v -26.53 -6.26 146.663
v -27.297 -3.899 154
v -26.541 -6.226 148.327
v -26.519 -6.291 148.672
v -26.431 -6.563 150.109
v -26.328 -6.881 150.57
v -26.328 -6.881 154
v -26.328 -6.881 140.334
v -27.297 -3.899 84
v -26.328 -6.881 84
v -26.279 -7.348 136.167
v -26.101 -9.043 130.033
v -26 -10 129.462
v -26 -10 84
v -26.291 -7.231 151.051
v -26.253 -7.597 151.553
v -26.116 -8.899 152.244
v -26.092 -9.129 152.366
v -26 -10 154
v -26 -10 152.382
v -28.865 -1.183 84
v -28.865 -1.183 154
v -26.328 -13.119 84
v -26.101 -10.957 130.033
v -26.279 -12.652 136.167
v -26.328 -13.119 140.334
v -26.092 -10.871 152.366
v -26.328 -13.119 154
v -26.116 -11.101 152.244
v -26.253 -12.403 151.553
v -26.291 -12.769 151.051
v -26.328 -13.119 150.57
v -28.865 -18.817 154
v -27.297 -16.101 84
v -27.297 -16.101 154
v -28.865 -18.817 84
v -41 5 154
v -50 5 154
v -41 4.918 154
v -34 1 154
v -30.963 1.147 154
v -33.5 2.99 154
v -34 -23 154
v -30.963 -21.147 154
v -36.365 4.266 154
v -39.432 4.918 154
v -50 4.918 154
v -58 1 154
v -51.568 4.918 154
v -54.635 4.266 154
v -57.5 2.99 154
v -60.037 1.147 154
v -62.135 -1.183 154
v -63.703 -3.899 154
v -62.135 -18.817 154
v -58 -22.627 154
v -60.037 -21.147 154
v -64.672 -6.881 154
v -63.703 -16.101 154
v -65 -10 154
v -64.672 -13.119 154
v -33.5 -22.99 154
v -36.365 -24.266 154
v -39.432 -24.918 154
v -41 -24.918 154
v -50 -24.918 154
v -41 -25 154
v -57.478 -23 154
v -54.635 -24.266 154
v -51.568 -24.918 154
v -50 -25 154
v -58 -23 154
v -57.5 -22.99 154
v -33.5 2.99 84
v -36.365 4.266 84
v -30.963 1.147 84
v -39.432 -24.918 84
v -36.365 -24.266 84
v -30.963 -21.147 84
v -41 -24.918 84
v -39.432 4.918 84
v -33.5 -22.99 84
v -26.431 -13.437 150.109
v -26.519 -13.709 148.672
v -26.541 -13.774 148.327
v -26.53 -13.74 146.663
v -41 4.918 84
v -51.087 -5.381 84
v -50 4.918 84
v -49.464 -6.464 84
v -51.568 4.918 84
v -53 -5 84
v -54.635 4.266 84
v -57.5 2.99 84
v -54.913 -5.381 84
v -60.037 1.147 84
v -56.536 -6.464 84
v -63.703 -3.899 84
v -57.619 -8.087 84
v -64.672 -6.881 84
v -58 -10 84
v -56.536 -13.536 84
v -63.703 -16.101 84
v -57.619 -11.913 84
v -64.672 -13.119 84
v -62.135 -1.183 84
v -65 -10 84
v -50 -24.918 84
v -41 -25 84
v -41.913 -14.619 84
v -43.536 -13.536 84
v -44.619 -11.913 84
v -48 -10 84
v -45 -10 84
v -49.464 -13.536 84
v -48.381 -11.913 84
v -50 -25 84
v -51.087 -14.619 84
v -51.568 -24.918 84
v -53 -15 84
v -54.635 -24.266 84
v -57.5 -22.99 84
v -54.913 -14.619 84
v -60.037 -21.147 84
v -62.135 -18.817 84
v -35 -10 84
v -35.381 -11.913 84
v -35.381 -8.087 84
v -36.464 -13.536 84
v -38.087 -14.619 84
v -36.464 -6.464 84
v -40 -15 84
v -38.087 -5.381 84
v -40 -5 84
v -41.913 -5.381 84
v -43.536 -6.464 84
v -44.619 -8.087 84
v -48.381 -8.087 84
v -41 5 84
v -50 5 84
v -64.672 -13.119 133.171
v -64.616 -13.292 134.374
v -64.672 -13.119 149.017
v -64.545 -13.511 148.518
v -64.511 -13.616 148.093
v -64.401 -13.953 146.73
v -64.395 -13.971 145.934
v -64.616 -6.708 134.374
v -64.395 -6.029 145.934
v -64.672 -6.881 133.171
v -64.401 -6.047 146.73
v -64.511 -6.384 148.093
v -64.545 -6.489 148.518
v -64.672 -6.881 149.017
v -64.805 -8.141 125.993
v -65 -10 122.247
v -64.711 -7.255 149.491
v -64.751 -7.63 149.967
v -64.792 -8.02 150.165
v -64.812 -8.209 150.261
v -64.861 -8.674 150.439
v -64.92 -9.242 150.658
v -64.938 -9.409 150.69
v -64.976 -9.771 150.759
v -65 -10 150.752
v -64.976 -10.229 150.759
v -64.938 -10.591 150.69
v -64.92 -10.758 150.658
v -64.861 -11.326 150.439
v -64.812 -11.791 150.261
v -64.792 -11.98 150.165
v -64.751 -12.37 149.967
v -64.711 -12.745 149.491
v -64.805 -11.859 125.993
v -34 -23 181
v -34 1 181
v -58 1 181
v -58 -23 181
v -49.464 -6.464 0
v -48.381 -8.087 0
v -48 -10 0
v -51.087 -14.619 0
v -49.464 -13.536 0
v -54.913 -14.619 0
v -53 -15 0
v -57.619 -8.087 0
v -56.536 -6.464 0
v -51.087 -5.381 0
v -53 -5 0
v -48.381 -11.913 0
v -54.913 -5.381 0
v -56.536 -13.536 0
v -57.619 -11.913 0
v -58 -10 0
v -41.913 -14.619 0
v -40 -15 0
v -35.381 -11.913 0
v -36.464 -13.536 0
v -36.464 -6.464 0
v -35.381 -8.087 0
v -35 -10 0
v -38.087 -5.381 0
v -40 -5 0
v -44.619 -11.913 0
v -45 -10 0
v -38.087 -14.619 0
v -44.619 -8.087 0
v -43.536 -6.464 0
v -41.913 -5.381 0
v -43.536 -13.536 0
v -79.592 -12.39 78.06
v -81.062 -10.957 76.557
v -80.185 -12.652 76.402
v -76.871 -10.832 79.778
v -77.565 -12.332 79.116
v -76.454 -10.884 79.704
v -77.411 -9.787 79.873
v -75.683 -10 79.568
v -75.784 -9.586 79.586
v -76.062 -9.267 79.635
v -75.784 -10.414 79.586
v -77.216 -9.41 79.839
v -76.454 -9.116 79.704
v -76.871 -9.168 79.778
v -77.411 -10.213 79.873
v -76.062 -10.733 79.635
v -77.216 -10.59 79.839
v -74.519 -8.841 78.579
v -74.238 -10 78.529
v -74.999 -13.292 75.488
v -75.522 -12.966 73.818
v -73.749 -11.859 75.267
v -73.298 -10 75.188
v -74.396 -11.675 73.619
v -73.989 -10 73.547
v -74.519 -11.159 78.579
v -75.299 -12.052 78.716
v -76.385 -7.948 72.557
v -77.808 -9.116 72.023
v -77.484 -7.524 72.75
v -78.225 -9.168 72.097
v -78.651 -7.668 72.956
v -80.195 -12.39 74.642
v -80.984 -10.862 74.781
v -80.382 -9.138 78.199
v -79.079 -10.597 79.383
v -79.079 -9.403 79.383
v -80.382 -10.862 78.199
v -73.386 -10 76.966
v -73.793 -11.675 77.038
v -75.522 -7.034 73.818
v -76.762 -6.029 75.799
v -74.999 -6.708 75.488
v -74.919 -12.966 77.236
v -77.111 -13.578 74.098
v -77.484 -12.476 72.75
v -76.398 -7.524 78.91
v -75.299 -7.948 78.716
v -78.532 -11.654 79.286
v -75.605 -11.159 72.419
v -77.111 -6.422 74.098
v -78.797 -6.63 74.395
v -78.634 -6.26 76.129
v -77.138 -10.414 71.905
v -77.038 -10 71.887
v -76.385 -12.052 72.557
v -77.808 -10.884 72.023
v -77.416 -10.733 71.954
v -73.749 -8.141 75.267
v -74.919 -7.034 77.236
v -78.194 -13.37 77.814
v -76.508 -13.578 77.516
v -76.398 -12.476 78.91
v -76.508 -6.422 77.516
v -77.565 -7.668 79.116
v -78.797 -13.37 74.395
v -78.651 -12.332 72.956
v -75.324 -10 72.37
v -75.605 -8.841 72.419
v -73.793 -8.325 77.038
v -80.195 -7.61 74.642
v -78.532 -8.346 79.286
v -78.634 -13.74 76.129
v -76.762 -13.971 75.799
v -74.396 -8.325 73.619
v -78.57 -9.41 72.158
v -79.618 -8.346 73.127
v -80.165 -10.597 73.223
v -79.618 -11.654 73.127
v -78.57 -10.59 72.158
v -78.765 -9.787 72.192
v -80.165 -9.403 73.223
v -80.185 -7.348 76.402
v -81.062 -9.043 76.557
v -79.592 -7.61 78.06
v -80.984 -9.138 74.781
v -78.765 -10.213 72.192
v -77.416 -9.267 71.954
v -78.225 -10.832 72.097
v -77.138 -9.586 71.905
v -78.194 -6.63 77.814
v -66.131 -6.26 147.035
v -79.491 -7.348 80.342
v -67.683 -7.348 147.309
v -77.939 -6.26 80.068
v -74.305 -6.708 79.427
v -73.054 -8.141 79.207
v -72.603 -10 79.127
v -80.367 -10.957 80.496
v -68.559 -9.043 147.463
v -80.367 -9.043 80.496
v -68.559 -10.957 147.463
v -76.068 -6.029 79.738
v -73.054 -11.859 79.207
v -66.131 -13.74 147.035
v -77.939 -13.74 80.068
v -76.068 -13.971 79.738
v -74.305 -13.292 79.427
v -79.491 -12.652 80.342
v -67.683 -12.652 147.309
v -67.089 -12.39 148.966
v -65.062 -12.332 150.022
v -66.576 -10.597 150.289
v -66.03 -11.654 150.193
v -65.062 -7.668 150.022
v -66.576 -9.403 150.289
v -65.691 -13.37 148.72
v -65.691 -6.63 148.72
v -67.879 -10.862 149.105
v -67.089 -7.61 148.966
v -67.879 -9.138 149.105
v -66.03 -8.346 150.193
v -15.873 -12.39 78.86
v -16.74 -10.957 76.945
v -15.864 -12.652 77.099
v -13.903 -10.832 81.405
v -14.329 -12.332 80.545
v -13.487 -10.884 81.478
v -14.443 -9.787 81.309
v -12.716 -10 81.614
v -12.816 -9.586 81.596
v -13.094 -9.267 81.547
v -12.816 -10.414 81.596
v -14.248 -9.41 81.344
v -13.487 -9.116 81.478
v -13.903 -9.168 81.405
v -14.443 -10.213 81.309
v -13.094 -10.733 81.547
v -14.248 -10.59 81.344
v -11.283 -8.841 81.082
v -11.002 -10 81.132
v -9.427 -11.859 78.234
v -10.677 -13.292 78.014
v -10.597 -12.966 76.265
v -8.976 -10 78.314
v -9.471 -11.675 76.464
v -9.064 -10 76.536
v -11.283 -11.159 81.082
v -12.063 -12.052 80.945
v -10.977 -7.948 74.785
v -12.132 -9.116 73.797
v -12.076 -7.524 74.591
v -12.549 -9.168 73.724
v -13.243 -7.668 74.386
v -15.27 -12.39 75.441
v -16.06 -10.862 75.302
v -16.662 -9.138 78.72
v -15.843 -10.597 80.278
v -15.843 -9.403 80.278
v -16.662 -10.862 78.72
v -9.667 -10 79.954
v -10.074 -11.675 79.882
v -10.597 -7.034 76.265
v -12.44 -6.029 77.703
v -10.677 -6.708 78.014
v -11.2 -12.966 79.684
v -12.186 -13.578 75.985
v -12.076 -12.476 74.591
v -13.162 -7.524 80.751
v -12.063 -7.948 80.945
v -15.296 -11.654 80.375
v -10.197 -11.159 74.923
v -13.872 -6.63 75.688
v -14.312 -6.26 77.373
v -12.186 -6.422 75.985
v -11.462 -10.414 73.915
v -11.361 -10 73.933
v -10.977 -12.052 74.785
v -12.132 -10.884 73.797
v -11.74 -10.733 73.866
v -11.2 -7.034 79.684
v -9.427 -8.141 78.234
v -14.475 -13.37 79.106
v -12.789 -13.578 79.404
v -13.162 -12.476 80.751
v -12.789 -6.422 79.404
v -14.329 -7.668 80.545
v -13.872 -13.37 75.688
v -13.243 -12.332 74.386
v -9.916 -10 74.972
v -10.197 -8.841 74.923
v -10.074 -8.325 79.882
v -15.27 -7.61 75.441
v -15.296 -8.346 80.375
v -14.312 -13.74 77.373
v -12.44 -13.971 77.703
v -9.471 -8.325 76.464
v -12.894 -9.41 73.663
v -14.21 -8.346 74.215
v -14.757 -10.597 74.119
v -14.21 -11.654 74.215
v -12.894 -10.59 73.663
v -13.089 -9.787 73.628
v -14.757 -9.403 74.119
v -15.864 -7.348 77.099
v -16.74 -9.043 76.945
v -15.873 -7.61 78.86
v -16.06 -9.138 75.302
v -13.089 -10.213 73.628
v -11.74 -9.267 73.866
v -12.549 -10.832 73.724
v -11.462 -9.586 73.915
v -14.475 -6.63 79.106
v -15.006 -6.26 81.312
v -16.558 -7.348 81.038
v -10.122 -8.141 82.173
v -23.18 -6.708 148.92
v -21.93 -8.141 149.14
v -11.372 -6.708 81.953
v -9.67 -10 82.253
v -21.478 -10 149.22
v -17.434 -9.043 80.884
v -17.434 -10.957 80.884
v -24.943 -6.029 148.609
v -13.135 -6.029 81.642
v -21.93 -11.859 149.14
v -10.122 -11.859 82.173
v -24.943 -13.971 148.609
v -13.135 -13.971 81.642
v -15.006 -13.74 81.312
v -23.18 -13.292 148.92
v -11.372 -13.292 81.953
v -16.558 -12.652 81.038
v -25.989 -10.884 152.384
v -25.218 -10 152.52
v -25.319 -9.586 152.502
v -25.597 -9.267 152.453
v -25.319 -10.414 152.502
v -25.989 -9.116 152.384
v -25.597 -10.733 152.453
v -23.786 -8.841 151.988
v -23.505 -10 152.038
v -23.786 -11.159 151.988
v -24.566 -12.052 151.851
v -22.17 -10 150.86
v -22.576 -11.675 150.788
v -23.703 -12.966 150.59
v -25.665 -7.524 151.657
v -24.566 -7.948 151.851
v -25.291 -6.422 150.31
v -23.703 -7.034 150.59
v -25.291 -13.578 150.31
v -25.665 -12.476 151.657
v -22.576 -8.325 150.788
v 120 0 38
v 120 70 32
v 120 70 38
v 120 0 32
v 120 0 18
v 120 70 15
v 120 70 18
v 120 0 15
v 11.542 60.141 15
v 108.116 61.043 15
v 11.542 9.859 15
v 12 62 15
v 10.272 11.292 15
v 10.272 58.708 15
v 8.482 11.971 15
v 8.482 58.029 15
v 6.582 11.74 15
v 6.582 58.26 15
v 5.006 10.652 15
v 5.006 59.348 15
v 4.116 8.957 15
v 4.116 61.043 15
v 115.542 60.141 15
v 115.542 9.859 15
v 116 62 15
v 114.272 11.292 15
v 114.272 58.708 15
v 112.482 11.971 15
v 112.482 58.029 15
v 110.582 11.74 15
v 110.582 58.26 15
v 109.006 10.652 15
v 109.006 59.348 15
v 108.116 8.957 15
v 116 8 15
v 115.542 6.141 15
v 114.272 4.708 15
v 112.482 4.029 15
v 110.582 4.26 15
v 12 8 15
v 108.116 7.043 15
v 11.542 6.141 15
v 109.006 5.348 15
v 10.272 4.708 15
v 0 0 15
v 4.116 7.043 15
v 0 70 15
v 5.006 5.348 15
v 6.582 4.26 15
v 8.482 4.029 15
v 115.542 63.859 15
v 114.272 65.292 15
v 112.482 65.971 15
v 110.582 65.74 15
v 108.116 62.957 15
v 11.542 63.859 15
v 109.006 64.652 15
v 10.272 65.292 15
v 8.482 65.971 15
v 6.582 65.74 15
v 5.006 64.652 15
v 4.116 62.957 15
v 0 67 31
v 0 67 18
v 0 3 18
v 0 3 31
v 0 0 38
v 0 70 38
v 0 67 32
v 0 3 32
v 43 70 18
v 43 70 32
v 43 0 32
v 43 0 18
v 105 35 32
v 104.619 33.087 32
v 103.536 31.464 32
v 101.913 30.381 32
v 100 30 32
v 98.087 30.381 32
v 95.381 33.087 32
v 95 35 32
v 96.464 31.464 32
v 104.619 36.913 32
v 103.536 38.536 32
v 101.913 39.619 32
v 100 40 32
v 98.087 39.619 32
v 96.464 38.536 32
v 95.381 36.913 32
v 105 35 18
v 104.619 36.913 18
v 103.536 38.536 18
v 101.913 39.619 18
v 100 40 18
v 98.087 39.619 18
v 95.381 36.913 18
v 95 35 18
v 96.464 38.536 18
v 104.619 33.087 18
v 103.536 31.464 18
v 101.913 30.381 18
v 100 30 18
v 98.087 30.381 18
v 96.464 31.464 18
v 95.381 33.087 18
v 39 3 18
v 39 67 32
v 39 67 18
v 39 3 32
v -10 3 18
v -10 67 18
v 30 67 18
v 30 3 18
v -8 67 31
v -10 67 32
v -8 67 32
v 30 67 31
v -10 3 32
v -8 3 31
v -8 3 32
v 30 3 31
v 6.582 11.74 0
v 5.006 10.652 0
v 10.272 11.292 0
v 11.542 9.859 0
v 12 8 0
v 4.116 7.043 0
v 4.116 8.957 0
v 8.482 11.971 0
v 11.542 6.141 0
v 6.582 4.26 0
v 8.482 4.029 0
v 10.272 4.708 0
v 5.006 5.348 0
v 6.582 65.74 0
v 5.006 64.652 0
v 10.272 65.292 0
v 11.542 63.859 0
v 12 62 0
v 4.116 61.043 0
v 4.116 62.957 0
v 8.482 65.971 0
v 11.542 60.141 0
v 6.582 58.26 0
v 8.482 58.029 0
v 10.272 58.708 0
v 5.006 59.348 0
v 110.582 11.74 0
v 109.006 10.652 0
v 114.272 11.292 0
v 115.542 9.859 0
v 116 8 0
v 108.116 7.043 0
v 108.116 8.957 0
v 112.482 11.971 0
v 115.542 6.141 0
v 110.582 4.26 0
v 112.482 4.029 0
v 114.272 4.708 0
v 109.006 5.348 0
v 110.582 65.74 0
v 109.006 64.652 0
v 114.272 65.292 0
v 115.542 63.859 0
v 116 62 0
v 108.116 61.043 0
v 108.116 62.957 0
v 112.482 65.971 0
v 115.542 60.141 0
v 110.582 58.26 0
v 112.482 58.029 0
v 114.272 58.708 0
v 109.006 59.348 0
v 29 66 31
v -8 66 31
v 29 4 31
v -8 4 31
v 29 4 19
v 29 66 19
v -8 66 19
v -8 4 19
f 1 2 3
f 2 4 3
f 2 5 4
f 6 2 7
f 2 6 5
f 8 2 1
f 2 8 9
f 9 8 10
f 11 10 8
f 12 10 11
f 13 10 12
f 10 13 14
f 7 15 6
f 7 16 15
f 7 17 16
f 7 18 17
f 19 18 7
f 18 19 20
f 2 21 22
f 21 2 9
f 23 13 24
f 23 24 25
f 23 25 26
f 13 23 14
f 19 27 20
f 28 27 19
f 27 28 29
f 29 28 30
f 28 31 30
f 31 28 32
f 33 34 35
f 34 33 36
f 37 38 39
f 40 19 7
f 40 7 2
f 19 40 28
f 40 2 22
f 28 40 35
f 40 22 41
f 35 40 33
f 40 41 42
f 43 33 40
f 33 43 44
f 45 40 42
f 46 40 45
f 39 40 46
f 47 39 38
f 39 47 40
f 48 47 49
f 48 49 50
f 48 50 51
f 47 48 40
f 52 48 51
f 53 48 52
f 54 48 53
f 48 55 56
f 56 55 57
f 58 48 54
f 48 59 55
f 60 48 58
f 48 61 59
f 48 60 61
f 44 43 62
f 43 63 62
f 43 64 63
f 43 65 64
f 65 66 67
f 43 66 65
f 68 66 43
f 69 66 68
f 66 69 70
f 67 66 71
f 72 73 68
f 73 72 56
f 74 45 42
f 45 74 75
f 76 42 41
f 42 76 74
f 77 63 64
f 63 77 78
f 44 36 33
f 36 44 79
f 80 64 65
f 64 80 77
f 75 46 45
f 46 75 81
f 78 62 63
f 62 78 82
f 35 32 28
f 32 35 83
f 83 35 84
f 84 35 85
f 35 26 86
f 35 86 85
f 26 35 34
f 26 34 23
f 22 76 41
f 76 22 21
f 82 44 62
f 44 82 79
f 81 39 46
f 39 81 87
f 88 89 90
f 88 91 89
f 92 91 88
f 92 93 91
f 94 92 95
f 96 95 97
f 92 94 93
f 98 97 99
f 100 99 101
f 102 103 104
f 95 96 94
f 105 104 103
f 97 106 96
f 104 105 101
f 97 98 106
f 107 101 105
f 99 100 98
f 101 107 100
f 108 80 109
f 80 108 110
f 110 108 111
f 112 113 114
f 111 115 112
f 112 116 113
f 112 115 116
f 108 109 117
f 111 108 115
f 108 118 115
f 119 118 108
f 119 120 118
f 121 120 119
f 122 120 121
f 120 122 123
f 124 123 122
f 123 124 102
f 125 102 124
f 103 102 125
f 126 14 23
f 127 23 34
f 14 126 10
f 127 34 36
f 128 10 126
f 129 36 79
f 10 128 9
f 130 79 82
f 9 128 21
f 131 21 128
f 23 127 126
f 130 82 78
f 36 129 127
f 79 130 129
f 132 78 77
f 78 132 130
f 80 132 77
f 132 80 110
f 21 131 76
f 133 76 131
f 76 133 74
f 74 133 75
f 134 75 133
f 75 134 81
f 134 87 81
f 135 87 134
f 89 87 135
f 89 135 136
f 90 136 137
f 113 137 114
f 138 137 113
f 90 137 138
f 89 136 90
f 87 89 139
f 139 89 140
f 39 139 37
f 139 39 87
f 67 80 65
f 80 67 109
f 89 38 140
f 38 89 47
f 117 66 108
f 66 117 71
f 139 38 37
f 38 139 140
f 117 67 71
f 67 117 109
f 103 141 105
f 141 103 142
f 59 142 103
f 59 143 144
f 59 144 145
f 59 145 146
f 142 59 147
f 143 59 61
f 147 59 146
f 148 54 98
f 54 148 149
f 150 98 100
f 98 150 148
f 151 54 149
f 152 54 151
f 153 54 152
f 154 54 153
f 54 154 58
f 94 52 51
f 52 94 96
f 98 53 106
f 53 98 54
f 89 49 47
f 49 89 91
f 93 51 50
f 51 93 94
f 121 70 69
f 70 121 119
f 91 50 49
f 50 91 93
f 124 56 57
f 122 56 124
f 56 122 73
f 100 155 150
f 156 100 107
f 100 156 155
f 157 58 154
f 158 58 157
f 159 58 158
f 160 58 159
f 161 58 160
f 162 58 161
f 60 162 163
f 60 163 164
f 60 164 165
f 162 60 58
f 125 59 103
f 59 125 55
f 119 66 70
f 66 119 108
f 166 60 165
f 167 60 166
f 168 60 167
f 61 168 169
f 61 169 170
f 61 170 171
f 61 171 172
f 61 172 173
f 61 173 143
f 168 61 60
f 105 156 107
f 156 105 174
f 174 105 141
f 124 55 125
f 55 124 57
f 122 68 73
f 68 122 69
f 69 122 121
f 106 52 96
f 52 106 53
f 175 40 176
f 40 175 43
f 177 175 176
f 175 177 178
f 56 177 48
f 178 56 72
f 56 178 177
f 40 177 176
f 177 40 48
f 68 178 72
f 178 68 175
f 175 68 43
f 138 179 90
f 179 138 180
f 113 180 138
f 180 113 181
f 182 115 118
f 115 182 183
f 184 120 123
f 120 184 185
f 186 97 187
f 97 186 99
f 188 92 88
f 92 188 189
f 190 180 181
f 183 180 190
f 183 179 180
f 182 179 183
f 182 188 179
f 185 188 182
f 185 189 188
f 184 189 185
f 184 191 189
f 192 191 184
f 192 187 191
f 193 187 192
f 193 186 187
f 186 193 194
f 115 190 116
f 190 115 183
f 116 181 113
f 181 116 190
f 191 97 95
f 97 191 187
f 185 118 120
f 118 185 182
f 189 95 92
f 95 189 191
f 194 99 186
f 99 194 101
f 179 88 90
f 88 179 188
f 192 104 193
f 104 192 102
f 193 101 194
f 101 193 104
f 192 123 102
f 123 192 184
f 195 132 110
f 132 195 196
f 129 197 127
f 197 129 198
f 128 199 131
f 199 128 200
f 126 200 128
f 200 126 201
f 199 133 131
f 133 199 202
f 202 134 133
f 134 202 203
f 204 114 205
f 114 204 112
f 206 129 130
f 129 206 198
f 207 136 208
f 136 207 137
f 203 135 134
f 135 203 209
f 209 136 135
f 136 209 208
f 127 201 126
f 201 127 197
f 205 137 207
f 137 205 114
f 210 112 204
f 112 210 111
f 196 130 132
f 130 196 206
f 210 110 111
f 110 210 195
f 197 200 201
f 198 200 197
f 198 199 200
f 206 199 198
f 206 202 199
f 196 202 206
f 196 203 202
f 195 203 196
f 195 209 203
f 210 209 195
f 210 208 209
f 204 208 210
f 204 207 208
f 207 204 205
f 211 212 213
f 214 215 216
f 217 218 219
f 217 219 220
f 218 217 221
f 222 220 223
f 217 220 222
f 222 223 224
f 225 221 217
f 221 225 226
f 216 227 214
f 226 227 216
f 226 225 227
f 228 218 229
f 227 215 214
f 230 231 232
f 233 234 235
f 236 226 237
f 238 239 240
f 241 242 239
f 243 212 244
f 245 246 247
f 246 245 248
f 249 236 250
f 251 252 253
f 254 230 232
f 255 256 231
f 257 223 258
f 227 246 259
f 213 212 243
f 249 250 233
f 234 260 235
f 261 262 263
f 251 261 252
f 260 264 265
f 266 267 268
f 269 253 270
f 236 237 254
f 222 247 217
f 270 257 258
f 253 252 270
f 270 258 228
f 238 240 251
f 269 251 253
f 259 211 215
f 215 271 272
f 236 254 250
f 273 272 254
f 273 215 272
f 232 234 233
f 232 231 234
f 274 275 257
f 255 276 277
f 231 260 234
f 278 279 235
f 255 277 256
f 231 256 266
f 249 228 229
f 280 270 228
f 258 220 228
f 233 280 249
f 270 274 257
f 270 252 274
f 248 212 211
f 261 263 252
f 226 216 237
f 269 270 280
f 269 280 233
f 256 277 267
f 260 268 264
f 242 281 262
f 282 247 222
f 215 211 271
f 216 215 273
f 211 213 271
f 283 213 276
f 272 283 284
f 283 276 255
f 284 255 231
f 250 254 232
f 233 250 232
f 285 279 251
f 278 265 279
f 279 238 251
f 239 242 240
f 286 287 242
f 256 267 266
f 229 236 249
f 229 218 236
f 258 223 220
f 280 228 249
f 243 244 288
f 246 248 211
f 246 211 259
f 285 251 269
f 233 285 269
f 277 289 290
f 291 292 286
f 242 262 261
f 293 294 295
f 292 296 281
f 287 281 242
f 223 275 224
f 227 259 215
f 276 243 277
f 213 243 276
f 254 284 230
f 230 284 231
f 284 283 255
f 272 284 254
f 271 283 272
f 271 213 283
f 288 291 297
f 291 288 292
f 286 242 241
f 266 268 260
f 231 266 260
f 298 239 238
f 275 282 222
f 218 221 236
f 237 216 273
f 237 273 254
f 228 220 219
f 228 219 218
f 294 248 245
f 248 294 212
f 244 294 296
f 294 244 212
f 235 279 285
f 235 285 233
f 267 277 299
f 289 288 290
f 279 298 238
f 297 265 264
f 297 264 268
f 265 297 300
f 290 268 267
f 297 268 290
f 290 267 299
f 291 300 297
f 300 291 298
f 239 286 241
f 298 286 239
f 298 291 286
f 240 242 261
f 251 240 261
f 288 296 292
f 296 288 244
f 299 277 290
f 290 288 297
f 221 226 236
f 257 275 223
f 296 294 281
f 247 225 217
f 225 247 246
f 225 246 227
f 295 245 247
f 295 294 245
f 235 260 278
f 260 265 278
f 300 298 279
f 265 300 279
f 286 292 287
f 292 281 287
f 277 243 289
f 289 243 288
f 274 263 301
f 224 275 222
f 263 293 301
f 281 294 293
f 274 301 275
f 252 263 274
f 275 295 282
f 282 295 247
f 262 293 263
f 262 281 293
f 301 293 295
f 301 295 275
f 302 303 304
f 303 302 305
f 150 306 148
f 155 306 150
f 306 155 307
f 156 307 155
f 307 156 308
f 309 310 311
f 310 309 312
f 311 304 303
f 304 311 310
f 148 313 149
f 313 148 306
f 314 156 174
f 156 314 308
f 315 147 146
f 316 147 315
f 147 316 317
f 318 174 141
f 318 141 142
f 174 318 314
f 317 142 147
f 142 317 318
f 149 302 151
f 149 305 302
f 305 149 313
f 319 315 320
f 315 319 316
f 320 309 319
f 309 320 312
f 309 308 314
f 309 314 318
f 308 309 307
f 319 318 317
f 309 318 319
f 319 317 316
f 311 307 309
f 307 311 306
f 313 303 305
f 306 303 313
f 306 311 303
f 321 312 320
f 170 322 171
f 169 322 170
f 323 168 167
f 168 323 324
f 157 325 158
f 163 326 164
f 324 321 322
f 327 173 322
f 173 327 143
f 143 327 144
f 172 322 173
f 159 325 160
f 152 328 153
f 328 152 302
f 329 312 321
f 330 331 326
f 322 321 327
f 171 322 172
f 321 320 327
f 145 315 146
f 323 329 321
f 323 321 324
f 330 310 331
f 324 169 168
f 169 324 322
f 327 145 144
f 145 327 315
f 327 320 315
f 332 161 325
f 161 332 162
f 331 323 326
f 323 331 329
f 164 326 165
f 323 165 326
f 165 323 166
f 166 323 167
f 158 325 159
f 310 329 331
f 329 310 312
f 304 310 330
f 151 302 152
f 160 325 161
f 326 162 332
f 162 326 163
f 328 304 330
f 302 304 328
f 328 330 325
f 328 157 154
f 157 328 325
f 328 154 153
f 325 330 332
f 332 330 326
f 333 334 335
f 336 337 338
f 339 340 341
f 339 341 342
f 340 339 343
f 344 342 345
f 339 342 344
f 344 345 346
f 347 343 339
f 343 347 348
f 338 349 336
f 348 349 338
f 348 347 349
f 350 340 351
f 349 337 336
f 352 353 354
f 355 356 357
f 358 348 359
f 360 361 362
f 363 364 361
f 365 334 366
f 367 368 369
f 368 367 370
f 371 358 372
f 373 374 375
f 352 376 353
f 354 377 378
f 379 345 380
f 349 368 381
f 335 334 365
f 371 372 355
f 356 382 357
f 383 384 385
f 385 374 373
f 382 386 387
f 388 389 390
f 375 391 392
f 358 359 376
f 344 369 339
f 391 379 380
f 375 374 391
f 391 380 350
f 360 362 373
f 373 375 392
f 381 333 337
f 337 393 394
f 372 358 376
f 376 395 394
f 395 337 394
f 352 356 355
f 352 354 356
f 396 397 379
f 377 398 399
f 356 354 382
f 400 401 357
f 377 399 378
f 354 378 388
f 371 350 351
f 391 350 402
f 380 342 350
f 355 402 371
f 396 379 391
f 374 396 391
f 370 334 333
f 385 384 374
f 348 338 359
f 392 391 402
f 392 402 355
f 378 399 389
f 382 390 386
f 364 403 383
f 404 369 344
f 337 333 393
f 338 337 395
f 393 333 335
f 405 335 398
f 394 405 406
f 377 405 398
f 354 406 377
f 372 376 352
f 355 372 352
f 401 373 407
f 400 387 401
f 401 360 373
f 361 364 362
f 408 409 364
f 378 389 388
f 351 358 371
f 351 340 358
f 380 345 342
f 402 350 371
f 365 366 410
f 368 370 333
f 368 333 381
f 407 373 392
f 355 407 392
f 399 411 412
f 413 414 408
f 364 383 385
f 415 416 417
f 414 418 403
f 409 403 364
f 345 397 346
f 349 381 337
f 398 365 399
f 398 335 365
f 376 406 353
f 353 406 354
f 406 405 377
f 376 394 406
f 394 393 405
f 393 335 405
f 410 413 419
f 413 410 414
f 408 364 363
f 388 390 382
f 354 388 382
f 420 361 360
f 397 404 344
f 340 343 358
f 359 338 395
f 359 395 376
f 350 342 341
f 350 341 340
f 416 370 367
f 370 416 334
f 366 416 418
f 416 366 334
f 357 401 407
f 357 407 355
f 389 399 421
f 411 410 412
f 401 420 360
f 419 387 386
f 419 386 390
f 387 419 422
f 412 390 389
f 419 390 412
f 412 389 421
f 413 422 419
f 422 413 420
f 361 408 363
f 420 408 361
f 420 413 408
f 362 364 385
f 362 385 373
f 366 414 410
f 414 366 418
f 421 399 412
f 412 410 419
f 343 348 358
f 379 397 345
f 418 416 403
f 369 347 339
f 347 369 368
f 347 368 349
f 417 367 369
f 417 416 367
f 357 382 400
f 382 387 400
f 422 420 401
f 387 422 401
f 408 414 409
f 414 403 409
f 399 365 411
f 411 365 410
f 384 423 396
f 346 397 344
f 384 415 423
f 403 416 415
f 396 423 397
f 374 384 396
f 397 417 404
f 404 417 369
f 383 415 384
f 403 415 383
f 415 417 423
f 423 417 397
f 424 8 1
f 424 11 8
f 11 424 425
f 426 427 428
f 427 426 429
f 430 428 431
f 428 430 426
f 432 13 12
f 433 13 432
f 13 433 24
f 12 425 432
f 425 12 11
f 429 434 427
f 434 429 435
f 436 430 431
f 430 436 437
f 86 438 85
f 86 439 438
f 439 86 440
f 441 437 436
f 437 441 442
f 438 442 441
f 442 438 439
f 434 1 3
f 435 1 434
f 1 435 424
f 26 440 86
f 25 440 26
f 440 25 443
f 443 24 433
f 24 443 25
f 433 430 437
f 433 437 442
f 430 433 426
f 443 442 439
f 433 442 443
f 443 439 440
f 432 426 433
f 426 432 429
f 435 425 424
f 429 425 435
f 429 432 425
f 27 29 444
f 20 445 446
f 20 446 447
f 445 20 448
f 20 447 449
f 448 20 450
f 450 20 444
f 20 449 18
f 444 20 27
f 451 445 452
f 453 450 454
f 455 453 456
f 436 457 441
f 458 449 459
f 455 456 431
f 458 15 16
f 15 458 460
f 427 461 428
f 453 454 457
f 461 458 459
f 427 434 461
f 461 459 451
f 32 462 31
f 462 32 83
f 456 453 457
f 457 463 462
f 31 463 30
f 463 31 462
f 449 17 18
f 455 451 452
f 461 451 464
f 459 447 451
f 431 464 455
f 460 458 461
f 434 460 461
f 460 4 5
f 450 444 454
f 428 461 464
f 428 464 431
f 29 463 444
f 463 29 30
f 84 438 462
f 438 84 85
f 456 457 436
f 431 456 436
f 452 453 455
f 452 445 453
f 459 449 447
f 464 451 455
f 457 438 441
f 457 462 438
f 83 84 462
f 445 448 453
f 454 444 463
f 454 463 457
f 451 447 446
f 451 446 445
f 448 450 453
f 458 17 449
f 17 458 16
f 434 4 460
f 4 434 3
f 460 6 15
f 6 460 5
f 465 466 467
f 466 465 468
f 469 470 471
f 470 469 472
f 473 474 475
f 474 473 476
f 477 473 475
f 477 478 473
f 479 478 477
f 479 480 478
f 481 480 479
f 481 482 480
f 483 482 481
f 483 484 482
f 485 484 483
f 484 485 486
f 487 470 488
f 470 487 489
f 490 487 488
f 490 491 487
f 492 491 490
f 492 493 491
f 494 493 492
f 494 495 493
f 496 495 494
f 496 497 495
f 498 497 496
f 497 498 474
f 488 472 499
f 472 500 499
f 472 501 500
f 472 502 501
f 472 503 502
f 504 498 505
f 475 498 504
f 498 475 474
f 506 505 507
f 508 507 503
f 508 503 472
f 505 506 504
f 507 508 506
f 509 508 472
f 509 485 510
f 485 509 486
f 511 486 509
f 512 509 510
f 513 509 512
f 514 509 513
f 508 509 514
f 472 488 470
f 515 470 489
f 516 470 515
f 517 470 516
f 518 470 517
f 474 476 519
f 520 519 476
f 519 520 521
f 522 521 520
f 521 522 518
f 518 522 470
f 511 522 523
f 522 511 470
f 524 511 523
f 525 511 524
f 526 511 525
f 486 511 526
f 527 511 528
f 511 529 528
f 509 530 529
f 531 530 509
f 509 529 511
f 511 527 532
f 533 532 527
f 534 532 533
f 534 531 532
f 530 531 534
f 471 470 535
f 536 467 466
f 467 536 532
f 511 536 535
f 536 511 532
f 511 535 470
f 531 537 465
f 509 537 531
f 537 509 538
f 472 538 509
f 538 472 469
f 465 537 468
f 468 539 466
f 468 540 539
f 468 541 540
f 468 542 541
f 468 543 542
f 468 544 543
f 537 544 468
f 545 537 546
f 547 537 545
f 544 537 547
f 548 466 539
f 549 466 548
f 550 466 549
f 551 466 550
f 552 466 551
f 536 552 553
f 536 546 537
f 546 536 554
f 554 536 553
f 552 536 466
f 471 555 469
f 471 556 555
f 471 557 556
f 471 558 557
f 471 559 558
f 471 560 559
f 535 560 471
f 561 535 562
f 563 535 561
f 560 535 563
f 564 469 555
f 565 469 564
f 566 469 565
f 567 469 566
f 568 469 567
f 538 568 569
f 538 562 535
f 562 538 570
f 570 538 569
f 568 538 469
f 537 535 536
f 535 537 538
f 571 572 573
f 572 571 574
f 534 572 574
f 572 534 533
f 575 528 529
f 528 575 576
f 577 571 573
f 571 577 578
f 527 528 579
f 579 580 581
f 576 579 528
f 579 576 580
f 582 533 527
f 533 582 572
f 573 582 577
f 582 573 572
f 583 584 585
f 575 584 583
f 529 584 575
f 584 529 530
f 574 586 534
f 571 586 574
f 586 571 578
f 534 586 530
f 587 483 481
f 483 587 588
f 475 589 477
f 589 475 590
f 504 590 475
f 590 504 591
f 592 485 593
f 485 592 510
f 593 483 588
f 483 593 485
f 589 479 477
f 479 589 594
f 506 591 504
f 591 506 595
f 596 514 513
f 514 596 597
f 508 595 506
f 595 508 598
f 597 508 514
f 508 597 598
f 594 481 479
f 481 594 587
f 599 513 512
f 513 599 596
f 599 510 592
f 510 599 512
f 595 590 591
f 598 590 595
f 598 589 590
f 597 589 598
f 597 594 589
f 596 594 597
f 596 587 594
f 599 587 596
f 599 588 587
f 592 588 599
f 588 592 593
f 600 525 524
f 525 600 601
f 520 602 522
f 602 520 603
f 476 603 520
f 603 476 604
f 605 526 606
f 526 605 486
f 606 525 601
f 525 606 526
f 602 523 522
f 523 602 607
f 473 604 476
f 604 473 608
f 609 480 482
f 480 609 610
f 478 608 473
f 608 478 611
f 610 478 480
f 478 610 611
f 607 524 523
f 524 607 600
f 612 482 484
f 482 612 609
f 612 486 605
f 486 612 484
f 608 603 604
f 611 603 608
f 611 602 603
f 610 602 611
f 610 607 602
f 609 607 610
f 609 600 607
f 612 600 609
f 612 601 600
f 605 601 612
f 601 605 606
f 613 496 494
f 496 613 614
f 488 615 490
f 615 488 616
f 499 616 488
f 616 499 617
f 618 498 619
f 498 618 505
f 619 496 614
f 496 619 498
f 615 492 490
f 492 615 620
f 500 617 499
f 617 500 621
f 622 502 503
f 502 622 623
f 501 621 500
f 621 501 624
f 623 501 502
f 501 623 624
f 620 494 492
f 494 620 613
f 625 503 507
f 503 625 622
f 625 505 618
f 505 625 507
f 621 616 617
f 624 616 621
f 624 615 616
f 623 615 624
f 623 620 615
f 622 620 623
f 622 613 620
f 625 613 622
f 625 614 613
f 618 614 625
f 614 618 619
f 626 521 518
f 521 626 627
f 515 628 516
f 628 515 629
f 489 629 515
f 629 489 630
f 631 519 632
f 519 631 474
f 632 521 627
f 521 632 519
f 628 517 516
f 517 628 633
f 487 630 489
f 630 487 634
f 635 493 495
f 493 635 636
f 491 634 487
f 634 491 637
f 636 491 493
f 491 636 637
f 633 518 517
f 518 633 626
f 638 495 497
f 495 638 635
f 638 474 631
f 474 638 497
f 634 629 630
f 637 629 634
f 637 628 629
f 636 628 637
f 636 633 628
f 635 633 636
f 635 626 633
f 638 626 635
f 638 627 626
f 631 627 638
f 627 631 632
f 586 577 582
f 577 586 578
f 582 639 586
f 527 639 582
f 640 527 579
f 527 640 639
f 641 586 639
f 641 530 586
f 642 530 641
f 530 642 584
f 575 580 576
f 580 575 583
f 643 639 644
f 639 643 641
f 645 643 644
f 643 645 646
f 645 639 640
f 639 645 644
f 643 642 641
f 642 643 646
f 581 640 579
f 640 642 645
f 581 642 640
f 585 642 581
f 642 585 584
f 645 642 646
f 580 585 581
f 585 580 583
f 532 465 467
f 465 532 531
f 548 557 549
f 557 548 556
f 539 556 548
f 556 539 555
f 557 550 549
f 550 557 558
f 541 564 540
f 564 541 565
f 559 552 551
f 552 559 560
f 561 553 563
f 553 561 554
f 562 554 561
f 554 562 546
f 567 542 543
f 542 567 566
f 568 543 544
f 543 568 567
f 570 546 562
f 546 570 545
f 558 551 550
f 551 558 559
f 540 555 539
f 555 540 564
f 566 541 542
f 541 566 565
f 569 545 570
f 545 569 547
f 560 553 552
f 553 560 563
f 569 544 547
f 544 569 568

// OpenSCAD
union() {
	union() {
		translate(v = [-50, -10, 0]) {
			color(c = [0.1000000000, 0.9000000000, 0.1000000000]) {
				union() {
					union() {
						translate(v = [0, 0, 84]) {
							union() {
								cylinder(h = 70, r = 15);
								union() {
									translate(v = [9, 0, 0]) {
										cylinder(h = 70, r = 15);
									}
									translate(v = [0, -15, 0]) {
										cube(size = [9, 30, 70]);
									}
								}
							}
						}
						translate(v = [-8, -13, 154]) {
							cube(size = [24, 24, 27]);
						}
					}
					union() {
						union() {
							translate(v = [-3, 0, 0]) {
								cylinder(h = 84, r = 5);
							}
							translate(v = [13, 0, 0]) {
								translate(v = [-3, 0, 0]) {
									cylinder(h = 84, r = 5);
								}
							}
						}
						union() {
							rotate(a = [0, 10, 0]) {
								translate(v = [-40, 0, 70]) {
									union() {
										union() {
											sphere(r = 4);
											translate(v = [0, 0, 4]) {
												cylinder(h = 68, r = 4);
											}
										}
										translate(v = [0, 0, 72]) {
											sphere(r = 4);
										}
									}
								}
							}
							rotate(a = [0, -10, 0]) {
								translate(v = [50, 0, 70]) {
									union() {
										union() {
											sphere(r = 4);
											translate(v = [0, 0, 4]) {
												cylinder(h = 68, r = 4);
											}
										}
										translate(v = [0, 0, 72]) {
											sphere(r = 4);
										}
									}
								}
							}
						}
					}
				}
			}
		}
		union() {
			color(c = [0.5490196078, 0.3137254902, 0.1294117647]) {
				translate(v = [0, 0, 15]) {
					difference() {
						difference() {
							cube(size = [120, 70, 20]);
							translate(v = [43, -1, 3]) {
								cube(size = [81, 72, 14]);
							}
						}
						translate(v = [-1, 3, 3]) {
							cube(size = [40, 64, 14]);
						}
					}
				}
			}
			color(c = [0, 0, 0]) {
				union() {
					union() {
						translate(v = [8, 8, 0]) {
							cylinder(h = 15, r = 4);
						}
						translate(v = [8, 62, 0]) {
							cylinder(h = 15, r = 4);
						}
					}
					union() {
						translate(v = [112, 8, 0]) {
							cylinder(h = 15, r = 4);
						}
						translate(v = [112, 62, 0]) {
							cylinder(h = 15, r = 4);
						}
					}
				}
			}
		}
	}
	union() {
		translate(v = [100, 35, 15]) {
			color(c = [0, 0, 0]) {
				cylinder(h = 19, r = 5);
			}
		}
		union() {
			translate(v = [0, 0, 35]) {
				color(c = [1, 1, 1, 0.3000000000]) {
					cube(size = [120, 70, 3]);
				}
			}
			translate(v = [-10, 3, 18]) {
				color(c = [0.1000000000, 0.1000000000, 0.9000000000]) {
					union() {
						union() {
							difference() {
								cube(size = [40, 64, 13]);
								translate(v = [1, 1, 1]) {
									cube(size = [38, 62, 15]);
								}
							}
							cube(size = [2, 64, 14]);
						}
						translate(v = [13, 32, 7]) {
							rotate(a = [0, 0, 135]) {
								difference() {
									difference() {
										circle(r = 19);
										rotate(a = 0) {
											translate(v = [0, -19, 0]) {
												square(center = true, size = [57, 38]);
											}
										}
										rotate(a = -90.0000000000) {
											translate(v = [0, -19, 0]) {
												square(center = true, size = [57, 38]);
											}
										}
									}
									difference() {
										circle(r = 17);
										rotate(a = -1) {
											translate(v = [0, -17, 0]) {
												square(center = true, size = [51, 34]);
											}
										}
										rotate(a = -89.0000000000) {
											translate(v = [0, -17, 0]) {
												square(center = true, size = [51, 34]);
											}
										}
									}
								}
							}
						}
					}
				}
			}
		}
	}
}
